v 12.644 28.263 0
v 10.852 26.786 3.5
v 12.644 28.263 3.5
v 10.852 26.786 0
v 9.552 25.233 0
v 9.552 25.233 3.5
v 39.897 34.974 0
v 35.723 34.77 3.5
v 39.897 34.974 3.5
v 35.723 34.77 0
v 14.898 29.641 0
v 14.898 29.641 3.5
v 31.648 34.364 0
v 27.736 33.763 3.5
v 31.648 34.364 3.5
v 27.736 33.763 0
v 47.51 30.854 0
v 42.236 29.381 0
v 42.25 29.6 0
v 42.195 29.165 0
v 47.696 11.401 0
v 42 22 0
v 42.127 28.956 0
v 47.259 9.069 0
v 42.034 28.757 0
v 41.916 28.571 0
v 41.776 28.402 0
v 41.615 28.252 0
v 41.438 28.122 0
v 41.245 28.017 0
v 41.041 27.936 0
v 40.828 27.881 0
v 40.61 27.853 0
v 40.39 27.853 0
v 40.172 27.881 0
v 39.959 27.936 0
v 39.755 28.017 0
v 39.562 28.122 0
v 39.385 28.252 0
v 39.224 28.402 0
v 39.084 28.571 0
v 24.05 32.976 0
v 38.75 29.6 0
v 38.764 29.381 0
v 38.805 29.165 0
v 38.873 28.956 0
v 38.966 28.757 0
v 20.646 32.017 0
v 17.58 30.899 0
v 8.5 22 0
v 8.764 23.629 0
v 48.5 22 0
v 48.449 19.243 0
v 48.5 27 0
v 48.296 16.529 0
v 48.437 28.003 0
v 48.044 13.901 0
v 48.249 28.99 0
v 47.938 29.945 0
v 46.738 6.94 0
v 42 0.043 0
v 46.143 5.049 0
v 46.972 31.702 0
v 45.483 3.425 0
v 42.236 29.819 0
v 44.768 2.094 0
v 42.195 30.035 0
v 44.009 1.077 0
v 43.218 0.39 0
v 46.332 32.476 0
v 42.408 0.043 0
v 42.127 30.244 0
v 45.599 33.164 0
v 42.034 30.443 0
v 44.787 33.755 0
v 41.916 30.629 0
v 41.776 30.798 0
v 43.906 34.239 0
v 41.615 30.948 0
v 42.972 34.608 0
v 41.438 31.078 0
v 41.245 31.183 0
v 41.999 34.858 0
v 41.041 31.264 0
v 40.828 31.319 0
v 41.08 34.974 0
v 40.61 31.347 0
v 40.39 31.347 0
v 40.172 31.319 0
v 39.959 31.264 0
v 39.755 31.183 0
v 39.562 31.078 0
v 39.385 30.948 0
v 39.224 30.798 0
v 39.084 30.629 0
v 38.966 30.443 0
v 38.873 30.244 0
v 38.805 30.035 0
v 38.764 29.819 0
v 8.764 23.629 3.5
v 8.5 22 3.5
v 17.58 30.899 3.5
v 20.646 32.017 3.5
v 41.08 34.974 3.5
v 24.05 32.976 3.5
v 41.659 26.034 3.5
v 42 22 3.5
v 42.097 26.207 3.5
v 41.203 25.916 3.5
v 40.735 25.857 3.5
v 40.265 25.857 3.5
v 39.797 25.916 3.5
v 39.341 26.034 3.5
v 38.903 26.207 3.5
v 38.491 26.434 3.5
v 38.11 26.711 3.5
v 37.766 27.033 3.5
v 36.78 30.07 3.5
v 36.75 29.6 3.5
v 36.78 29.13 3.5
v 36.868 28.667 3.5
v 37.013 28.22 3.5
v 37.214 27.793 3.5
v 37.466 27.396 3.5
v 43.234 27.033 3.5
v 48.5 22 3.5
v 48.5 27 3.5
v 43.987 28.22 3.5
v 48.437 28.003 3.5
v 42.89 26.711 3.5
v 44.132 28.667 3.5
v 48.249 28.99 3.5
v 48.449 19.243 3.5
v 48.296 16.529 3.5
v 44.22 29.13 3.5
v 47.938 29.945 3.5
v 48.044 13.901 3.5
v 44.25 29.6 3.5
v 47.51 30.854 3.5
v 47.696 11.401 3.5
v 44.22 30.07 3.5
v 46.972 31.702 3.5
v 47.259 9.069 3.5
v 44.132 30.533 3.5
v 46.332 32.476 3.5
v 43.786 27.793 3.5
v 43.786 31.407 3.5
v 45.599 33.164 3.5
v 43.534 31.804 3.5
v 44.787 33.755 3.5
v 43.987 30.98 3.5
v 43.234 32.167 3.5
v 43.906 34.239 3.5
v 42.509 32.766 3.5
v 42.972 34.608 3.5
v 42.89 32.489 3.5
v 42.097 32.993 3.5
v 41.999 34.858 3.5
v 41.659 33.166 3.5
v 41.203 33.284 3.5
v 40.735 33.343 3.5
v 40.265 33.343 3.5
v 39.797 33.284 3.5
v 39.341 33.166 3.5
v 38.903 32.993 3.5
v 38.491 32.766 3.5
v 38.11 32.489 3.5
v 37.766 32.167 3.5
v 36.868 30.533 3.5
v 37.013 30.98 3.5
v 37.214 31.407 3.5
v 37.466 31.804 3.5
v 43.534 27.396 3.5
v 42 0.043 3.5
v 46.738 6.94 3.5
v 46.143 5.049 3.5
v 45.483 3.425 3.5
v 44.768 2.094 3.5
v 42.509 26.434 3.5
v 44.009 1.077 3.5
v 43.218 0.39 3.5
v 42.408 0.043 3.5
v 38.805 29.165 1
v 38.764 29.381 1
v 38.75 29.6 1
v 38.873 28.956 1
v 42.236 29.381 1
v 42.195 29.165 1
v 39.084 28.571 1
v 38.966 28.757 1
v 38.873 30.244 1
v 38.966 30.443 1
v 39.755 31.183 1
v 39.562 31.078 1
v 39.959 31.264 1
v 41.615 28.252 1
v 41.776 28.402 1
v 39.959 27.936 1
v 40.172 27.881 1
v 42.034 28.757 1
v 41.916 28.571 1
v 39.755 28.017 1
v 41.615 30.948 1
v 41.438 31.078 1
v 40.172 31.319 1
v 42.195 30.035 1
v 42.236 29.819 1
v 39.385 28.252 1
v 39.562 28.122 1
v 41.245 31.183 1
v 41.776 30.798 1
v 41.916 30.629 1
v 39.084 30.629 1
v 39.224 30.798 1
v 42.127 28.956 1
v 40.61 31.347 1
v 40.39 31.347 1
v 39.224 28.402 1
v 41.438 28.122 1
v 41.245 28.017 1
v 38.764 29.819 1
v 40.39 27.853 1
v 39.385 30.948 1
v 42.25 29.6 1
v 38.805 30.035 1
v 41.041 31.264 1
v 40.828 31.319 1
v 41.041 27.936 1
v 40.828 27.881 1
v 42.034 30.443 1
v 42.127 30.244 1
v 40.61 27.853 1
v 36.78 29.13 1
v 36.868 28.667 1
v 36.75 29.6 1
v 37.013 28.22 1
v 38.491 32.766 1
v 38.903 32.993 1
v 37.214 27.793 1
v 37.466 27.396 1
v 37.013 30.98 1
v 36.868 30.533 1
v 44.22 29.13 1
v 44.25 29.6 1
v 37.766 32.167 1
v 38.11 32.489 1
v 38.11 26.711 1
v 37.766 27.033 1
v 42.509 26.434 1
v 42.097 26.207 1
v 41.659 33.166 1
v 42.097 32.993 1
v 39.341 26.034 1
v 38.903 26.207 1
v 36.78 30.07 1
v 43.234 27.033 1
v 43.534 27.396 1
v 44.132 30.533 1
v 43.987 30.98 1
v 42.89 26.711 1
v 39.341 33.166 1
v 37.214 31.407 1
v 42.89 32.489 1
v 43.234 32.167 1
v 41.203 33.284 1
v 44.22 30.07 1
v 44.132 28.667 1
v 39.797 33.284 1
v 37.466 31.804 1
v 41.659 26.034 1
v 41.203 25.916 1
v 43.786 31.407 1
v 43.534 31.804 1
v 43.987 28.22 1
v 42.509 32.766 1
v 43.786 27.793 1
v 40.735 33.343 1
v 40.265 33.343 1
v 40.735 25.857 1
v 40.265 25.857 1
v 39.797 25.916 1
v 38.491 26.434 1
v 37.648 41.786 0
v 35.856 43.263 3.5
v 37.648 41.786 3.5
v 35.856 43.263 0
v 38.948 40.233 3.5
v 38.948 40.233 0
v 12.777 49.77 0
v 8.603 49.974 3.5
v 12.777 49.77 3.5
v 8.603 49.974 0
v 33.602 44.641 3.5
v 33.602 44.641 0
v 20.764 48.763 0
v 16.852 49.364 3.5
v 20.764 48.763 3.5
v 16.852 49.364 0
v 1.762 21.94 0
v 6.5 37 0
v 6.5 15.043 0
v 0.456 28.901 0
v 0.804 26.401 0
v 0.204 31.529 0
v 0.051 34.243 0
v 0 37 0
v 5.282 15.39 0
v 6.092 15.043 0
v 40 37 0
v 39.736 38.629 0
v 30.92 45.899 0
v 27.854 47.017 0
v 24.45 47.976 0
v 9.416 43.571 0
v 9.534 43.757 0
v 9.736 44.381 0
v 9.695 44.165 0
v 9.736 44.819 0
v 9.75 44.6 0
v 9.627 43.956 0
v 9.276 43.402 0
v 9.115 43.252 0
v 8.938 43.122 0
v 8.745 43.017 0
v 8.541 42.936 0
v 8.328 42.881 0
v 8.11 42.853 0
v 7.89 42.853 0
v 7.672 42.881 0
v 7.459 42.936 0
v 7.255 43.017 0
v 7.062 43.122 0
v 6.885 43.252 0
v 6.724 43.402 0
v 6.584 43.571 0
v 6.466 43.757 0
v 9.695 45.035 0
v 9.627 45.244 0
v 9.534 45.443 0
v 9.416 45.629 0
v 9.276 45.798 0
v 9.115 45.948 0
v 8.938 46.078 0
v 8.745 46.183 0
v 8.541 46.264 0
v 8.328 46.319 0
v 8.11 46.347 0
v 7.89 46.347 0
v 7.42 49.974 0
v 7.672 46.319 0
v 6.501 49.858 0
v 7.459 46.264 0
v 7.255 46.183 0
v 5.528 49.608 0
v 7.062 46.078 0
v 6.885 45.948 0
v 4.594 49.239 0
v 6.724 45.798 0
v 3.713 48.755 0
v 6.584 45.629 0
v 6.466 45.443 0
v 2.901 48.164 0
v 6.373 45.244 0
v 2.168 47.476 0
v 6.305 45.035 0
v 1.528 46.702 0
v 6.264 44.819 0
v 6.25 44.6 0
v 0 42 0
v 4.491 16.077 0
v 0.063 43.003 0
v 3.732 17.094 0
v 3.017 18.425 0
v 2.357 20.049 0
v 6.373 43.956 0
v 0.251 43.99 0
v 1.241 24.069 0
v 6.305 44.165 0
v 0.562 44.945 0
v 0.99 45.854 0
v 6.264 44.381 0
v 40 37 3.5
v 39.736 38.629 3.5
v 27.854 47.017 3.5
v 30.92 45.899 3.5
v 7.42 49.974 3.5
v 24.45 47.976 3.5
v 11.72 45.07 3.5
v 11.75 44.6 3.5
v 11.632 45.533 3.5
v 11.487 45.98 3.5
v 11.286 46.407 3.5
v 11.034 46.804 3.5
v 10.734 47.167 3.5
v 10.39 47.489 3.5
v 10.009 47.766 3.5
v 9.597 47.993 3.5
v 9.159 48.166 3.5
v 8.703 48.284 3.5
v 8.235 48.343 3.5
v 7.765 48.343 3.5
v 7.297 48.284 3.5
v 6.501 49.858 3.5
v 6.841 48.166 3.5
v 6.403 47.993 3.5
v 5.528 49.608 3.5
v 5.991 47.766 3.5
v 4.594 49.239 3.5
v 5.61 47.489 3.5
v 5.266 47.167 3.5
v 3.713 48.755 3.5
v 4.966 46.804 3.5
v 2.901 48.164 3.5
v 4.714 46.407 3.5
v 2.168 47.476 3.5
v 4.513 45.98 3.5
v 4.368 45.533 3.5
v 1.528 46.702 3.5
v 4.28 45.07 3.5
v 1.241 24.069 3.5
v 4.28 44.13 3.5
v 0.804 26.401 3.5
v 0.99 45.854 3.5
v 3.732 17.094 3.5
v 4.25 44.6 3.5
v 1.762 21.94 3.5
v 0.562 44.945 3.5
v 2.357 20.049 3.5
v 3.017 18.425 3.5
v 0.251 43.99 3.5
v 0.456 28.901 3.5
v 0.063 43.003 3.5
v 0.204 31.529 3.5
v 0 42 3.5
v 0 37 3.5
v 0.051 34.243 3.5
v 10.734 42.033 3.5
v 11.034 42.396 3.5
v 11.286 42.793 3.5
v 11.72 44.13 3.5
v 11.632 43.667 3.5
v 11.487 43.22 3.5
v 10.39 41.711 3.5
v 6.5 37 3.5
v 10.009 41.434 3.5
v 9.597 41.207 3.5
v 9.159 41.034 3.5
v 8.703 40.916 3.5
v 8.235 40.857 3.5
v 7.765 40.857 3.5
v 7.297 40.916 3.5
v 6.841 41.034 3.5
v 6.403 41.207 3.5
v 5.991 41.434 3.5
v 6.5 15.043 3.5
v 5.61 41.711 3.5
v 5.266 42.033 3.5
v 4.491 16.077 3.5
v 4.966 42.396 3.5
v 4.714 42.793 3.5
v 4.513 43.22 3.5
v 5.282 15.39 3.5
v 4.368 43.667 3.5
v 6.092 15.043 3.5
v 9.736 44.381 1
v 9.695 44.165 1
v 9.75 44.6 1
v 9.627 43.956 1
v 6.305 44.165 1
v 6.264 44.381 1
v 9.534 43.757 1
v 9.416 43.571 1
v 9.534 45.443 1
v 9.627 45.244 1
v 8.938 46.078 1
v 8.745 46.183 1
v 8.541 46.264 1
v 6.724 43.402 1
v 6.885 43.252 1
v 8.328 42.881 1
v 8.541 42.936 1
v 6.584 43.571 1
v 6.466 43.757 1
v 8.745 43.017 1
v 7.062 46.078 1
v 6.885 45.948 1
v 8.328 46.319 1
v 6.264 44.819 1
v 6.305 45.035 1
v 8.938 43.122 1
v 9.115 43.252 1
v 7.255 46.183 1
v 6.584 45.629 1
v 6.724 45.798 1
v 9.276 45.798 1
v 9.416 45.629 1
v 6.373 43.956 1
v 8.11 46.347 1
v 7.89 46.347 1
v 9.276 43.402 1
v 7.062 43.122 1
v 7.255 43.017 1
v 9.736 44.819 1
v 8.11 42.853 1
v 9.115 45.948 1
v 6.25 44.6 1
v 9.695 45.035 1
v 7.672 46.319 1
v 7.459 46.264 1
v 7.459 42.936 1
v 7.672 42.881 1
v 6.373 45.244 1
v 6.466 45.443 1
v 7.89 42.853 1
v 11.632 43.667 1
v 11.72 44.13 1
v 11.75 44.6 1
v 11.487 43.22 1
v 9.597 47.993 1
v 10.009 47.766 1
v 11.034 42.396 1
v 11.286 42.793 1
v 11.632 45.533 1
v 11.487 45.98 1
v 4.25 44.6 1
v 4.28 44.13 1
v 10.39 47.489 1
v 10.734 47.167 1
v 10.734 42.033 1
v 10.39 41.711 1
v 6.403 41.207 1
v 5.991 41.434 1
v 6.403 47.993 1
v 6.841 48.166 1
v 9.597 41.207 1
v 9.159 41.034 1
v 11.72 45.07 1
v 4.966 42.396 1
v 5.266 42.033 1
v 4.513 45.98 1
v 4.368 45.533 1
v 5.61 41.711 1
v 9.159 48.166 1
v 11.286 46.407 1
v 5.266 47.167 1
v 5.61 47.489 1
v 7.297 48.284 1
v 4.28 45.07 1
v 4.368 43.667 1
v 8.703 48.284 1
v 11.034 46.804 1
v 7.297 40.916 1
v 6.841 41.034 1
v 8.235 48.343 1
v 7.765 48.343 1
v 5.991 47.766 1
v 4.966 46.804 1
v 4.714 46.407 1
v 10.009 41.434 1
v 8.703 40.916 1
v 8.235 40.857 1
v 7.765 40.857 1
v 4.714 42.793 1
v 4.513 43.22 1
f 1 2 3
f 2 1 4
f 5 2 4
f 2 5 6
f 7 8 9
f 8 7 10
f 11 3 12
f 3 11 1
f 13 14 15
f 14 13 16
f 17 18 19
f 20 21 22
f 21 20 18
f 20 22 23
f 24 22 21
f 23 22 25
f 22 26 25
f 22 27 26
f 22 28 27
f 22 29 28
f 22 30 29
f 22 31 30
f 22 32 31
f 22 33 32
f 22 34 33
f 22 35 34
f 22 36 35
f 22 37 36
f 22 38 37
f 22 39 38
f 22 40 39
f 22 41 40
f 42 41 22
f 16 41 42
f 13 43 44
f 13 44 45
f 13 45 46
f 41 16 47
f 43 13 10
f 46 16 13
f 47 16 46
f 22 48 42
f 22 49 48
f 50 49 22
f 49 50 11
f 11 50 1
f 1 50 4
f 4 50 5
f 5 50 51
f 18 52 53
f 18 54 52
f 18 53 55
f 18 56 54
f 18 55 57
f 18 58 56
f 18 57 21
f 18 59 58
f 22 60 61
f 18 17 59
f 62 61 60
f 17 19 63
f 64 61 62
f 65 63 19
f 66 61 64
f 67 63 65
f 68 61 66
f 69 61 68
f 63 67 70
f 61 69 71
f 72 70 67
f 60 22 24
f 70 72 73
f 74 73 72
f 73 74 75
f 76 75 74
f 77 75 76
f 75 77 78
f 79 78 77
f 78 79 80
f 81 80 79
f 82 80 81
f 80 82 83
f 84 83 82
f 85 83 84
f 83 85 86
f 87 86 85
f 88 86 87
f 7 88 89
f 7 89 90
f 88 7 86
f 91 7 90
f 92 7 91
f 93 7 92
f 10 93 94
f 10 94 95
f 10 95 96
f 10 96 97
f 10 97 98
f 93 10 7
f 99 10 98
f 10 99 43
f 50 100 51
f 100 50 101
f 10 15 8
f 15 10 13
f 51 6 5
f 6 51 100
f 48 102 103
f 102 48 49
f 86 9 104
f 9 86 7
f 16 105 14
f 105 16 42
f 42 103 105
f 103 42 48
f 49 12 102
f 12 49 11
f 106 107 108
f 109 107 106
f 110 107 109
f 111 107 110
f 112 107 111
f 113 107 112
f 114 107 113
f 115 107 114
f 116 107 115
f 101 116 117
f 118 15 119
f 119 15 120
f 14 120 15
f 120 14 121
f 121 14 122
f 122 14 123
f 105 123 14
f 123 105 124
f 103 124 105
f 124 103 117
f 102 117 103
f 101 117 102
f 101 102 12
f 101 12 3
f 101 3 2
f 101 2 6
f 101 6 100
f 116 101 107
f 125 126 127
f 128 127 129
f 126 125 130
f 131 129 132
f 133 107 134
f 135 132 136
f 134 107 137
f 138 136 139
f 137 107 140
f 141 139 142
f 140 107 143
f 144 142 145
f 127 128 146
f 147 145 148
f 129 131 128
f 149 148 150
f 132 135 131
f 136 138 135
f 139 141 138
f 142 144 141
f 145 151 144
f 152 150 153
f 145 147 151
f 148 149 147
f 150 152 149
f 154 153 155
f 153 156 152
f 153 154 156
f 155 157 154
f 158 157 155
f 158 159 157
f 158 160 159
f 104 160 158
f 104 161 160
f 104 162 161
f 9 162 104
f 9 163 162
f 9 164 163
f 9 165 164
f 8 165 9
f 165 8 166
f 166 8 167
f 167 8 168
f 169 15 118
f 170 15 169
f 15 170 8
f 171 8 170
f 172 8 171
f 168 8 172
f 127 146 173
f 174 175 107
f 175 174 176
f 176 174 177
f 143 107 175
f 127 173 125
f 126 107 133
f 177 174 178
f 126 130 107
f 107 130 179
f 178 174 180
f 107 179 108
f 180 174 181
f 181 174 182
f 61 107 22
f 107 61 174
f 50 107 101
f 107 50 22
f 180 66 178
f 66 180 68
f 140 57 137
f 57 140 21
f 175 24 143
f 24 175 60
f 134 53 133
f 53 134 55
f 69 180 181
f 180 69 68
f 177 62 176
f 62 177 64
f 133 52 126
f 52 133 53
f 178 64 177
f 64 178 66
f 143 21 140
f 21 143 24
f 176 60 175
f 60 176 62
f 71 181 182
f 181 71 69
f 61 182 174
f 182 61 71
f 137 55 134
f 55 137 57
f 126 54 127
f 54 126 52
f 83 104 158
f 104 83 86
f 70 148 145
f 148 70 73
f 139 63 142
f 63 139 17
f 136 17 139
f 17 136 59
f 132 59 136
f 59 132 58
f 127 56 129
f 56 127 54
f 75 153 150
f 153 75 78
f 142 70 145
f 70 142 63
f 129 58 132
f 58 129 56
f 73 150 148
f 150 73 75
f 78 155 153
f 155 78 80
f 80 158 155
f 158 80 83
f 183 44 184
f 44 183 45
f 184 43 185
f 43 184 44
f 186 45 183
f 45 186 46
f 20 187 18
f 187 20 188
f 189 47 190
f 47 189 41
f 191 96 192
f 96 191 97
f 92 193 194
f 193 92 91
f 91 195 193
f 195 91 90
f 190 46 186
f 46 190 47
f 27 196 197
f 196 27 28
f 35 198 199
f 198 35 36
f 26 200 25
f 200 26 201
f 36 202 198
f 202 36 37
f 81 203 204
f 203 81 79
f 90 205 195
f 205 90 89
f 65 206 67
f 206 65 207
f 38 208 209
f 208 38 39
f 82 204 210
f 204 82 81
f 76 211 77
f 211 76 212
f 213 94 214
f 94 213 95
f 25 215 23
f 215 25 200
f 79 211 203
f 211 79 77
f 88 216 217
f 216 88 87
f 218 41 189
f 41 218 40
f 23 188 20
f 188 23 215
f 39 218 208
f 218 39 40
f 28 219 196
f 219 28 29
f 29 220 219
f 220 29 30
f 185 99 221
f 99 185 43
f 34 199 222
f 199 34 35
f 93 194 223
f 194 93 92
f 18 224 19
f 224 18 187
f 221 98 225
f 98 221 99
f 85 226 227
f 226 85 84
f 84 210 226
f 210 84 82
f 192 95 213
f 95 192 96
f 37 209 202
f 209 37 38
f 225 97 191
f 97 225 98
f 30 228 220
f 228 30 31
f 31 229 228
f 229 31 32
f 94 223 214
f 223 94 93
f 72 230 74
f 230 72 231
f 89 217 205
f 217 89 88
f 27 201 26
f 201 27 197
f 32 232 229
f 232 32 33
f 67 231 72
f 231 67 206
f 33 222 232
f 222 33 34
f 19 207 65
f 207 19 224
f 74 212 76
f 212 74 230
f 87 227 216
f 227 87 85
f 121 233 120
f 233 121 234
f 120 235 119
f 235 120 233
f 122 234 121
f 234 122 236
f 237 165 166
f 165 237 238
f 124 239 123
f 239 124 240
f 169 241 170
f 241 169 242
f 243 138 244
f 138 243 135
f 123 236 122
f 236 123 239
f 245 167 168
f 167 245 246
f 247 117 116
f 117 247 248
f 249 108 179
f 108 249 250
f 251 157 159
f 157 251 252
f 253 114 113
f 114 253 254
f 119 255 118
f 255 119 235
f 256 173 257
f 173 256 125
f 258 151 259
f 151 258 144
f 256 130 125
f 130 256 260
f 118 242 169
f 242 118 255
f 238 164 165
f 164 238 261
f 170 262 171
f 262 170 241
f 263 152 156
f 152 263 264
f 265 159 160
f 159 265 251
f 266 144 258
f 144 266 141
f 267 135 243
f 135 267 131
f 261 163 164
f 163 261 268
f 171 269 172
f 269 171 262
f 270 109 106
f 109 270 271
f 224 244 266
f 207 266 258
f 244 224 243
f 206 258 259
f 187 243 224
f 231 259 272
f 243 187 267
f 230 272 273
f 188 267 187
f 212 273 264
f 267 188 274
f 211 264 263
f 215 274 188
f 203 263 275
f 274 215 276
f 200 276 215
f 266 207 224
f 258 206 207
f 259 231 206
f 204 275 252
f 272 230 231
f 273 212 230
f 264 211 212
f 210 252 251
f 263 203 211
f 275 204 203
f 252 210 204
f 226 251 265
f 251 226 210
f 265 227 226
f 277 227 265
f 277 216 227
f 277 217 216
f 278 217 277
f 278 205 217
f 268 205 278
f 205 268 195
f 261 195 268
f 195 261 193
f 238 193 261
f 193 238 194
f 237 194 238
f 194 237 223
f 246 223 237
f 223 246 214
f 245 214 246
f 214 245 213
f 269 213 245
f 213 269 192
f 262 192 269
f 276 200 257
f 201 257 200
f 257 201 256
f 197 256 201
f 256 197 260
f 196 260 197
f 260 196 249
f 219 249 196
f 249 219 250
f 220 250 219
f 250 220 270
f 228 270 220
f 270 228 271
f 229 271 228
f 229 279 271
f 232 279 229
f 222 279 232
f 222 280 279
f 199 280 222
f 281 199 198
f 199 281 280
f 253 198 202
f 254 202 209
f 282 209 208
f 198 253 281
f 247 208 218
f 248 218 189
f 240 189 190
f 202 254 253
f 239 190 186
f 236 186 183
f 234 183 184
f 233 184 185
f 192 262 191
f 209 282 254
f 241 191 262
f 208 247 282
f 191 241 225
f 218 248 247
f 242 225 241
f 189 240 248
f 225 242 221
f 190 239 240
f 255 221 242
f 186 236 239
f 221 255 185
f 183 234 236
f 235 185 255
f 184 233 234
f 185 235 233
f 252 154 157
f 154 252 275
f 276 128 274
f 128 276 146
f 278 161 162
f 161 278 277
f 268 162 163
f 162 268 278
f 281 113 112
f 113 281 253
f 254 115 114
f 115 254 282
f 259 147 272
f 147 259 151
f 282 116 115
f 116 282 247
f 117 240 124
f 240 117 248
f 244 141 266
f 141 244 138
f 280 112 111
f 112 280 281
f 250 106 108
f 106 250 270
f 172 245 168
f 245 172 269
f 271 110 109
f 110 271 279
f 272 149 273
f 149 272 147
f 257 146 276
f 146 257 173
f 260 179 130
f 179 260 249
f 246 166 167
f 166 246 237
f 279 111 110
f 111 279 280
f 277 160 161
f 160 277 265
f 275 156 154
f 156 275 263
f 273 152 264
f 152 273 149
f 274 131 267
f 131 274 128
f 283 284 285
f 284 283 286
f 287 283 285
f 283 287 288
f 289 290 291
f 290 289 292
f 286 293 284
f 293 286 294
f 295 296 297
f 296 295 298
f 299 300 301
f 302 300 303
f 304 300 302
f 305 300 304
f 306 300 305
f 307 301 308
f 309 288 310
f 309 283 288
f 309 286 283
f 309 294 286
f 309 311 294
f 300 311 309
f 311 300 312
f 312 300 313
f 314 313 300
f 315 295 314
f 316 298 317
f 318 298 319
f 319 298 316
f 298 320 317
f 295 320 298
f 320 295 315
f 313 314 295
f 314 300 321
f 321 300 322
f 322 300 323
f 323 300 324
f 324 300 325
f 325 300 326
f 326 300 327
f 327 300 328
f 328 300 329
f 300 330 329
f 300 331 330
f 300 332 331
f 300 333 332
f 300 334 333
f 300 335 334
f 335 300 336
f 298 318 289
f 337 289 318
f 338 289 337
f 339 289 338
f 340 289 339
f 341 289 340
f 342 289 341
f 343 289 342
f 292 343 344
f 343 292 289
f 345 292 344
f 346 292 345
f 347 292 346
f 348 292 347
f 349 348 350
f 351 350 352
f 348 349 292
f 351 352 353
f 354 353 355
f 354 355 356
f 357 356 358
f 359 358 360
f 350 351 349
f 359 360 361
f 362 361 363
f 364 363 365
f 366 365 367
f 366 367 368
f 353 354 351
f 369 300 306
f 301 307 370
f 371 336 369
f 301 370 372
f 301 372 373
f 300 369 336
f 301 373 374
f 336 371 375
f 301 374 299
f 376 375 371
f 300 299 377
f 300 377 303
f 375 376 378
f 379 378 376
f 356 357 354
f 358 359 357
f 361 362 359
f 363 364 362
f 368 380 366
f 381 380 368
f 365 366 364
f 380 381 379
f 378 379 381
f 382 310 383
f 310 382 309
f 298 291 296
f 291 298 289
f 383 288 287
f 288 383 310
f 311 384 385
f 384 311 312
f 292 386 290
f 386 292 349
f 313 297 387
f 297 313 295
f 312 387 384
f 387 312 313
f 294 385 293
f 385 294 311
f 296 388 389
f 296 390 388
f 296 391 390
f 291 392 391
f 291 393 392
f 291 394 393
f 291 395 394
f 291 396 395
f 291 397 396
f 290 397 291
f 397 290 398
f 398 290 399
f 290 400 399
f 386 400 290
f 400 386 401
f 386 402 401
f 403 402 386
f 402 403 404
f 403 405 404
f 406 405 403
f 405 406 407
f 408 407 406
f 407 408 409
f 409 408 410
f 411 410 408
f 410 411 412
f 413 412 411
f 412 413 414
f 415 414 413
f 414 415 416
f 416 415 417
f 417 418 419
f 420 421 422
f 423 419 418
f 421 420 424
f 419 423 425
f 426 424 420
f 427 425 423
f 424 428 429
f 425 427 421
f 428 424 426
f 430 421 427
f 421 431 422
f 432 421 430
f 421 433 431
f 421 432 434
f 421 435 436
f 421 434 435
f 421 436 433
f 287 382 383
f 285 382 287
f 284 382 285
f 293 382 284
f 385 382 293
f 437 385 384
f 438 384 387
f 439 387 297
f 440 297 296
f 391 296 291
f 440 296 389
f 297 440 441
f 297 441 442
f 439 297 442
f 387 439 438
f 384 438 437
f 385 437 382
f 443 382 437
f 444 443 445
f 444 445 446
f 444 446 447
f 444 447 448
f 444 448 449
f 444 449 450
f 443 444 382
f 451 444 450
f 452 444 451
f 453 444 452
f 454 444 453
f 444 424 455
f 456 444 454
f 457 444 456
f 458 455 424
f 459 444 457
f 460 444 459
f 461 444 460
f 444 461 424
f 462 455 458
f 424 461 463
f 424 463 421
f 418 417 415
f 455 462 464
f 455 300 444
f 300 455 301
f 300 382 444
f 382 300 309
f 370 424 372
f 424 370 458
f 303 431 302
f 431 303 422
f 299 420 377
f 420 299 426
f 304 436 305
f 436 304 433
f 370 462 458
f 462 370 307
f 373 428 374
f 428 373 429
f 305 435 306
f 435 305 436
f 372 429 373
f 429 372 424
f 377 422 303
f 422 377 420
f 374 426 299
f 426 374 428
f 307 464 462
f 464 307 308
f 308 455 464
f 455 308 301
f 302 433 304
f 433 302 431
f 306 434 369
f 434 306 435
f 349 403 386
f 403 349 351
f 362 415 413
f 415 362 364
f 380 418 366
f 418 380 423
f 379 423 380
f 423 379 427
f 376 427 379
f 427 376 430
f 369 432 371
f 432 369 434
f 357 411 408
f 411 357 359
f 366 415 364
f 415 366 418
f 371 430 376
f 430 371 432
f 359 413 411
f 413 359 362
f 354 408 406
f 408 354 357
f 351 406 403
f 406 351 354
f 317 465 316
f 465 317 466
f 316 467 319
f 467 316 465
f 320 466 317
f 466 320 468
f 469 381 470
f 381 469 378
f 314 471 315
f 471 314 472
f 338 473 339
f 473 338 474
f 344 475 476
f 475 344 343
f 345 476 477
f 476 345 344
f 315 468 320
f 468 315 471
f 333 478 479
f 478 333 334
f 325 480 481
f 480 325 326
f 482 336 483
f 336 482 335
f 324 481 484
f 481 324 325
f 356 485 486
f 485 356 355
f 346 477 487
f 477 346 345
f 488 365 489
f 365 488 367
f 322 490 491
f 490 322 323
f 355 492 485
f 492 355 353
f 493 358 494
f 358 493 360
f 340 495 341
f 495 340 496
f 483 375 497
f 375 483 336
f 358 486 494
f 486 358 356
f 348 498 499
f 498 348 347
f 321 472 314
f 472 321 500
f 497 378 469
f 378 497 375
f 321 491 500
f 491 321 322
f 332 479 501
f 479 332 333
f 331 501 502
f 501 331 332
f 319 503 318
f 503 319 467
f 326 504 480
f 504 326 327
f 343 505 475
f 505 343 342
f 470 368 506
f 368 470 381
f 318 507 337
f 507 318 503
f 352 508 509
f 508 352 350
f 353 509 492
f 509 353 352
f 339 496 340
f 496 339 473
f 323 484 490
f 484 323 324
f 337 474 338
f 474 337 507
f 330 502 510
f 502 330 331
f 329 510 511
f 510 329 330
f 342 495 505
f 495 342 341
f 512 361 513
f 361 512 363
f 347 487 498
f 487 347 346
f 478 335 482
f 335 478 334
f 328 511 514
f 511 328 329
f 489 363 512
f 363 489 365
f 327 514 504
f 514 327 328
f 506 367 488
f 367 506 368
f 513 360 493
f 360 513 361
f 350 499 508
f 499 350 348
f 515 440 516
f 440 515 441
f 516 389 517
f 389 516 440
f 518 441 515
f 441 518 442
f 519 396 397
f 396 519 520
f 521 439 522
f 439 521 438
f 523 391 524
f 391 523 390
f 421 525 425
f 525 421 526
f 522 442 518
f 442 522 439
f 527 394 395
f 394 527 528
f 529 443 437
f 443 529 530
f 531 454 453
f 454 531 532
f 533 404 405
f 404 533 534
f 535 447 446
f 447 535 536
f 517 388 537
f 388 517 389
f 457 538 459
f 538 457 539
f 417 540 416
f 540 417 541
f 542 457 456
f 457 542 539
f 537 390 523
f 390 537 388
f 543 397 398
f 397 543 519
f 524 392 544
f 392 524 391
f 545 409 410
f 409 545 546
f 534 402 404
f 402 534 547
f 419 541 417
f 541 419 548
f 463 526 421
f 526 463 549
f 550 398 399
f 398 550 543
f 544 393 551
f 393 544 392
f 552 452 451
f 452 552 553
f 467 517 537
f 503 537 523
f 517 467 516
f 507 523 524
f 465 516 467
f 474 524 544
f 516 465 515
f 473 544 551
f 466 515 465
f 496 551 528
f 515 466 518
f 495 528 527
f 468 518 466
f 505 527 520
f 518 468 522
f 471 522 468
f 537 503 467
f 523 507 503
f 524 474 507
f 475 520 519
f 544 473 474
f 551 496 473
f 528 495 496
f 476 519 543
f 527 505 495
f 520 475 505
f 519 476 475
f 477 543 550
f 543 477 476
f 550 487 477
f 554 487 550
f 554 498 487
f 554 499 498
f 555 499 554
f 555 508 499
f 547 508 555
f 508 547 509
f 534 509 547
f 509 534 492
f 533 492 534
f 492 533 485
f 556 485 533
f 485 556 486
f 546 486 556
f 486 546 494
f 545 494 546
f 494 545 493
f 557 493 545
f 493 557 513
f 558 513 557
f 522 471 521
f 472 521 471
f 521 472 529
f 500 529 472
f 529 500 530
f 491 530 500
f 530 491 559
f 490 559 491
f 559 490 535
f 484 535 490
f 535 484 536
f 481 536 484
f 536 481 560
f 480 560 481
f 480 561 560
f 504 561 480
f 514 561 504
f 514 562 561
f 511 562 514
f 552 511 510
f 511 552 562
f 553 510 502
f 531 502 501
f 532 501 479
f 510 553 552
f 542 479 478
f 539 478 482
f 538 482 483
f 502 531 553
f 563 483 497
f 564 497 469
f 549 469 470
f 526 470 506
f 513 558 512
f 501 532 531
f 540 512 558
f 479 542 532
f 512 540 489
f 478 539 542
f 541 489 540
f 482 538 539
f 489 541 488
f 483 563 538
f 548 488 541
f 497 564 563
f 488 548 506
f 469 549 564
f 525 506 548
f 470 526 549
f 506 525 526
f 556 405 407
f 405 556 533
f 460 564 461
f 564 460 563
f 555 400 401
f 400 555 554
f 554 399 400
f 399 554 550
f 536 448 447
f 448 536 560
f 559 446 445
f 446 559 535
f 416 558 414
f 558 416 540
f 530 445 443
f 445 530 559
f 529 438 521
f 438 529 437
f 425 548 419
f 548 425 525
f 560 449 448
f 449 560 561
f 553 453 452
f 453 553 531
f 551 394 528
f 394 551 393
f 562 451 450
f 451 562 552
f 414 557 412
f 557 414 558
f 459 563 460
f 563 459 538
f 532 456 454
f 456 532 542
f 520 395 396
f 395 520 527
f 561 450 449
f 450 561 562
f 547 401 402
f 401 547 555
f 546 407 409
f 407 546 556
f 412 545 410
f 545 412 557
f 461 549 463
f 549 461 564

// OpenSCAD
$fn=50;

platen_thick = 3.5;
y_length = 35;
y_thickness = 6.5;
x_length = 40;
x_thickness = 13;
washer_diameter = 7.5;
screw_diameter = 3.5;
screw_radius_distance_from_glass_y = 7.6;
screw_radius_distance_from_glass_x = 1.5;
corner_round_diameter = 8;
screw_suppport_thickness = 1;

module xPartSmoothCylinder() {
translate([y_thickness,x_thickness]){
scale([(x_length-y_thickness)/x_thickness, 1, 1])
cylinder(platen_thick, x_thickness, x_thickness);
}
}


module yPartSmoothCylinder() {
    translate([y_thickness, x_thickness]){
        scale([1, (y_length-x_thickness)/y_thickness, 1])
            cylinder(platen_thick, y_thickness, y_thickness);
}
}


module xPart() {
    intersection(){
        xPartSmoothCylinder();
        translate([y_thickness, 0])
    cube([x_length-y_thickness,x_thickness,platen_thick]); 
          }   
}

module yPart() {
    intersection(){
        yPartSmoothCylinder();
        translate ([0, x_thickness])
    cube([y_thickness,y_length-x_thickness,platen_thick]);
    }
}

module union_block() {
    cube([y_thickness, x_thickness, platen_thick]);
}


module ScrewHole() {
  cylinder(platen_thick, d1=screw_diameter, d2=screw_diameter, center=false);  
}

module WasherHole() {
    translate([0,0,screw_suppport_thickness])
  cylinder(platen_thick, d1=washer_diameter, d2=washer_diameter, center=false);  
}


module RoundedCorner(){
translate([0, 0])
difference(){
cube([corner_round_diameter, corner_round_diameter, 2 * platen_thick]);
    translate([corner_round_diameter, corner_round_diameter]){
cylinder(2*platen_thick, corner_round_diameter, corner_round_diameter, center=false);
}}}

module MakeBracketRight(){
difference(){
    union(){
        xPart();
        yPart();
        union_block();
    };
    translate([y_thickness+screw_radius_distance_from_glass_x,x_thickness-screw_radius_distance_from_glass_y]){ScrewHole();
    }
    translate([y_thickness+screw_radius_distance_from_glass_x,x_thickness-screw_radius_distance_from_glass_y]){WasherHole();
    }
    RoundedCorner();
}
}



module MakeBracketRightSet() {
//MakeBracketRight();
translate([x_length+y_thickness+2,y_length])
rotate(a= 180, v=[0,0,1])
MakeBracketRight();
}


module MakeBracketLeftSet(){
    translate([x_length+y_thickness+2, x_thickness +2 ])
    mirror()
    MakeBracketRightSet();
}

MakeBracketRightSet();
MakeBracketLeftSet();

//translate([2*x_length+5, 0, 0])
//mirror()
//MakeBracket();
